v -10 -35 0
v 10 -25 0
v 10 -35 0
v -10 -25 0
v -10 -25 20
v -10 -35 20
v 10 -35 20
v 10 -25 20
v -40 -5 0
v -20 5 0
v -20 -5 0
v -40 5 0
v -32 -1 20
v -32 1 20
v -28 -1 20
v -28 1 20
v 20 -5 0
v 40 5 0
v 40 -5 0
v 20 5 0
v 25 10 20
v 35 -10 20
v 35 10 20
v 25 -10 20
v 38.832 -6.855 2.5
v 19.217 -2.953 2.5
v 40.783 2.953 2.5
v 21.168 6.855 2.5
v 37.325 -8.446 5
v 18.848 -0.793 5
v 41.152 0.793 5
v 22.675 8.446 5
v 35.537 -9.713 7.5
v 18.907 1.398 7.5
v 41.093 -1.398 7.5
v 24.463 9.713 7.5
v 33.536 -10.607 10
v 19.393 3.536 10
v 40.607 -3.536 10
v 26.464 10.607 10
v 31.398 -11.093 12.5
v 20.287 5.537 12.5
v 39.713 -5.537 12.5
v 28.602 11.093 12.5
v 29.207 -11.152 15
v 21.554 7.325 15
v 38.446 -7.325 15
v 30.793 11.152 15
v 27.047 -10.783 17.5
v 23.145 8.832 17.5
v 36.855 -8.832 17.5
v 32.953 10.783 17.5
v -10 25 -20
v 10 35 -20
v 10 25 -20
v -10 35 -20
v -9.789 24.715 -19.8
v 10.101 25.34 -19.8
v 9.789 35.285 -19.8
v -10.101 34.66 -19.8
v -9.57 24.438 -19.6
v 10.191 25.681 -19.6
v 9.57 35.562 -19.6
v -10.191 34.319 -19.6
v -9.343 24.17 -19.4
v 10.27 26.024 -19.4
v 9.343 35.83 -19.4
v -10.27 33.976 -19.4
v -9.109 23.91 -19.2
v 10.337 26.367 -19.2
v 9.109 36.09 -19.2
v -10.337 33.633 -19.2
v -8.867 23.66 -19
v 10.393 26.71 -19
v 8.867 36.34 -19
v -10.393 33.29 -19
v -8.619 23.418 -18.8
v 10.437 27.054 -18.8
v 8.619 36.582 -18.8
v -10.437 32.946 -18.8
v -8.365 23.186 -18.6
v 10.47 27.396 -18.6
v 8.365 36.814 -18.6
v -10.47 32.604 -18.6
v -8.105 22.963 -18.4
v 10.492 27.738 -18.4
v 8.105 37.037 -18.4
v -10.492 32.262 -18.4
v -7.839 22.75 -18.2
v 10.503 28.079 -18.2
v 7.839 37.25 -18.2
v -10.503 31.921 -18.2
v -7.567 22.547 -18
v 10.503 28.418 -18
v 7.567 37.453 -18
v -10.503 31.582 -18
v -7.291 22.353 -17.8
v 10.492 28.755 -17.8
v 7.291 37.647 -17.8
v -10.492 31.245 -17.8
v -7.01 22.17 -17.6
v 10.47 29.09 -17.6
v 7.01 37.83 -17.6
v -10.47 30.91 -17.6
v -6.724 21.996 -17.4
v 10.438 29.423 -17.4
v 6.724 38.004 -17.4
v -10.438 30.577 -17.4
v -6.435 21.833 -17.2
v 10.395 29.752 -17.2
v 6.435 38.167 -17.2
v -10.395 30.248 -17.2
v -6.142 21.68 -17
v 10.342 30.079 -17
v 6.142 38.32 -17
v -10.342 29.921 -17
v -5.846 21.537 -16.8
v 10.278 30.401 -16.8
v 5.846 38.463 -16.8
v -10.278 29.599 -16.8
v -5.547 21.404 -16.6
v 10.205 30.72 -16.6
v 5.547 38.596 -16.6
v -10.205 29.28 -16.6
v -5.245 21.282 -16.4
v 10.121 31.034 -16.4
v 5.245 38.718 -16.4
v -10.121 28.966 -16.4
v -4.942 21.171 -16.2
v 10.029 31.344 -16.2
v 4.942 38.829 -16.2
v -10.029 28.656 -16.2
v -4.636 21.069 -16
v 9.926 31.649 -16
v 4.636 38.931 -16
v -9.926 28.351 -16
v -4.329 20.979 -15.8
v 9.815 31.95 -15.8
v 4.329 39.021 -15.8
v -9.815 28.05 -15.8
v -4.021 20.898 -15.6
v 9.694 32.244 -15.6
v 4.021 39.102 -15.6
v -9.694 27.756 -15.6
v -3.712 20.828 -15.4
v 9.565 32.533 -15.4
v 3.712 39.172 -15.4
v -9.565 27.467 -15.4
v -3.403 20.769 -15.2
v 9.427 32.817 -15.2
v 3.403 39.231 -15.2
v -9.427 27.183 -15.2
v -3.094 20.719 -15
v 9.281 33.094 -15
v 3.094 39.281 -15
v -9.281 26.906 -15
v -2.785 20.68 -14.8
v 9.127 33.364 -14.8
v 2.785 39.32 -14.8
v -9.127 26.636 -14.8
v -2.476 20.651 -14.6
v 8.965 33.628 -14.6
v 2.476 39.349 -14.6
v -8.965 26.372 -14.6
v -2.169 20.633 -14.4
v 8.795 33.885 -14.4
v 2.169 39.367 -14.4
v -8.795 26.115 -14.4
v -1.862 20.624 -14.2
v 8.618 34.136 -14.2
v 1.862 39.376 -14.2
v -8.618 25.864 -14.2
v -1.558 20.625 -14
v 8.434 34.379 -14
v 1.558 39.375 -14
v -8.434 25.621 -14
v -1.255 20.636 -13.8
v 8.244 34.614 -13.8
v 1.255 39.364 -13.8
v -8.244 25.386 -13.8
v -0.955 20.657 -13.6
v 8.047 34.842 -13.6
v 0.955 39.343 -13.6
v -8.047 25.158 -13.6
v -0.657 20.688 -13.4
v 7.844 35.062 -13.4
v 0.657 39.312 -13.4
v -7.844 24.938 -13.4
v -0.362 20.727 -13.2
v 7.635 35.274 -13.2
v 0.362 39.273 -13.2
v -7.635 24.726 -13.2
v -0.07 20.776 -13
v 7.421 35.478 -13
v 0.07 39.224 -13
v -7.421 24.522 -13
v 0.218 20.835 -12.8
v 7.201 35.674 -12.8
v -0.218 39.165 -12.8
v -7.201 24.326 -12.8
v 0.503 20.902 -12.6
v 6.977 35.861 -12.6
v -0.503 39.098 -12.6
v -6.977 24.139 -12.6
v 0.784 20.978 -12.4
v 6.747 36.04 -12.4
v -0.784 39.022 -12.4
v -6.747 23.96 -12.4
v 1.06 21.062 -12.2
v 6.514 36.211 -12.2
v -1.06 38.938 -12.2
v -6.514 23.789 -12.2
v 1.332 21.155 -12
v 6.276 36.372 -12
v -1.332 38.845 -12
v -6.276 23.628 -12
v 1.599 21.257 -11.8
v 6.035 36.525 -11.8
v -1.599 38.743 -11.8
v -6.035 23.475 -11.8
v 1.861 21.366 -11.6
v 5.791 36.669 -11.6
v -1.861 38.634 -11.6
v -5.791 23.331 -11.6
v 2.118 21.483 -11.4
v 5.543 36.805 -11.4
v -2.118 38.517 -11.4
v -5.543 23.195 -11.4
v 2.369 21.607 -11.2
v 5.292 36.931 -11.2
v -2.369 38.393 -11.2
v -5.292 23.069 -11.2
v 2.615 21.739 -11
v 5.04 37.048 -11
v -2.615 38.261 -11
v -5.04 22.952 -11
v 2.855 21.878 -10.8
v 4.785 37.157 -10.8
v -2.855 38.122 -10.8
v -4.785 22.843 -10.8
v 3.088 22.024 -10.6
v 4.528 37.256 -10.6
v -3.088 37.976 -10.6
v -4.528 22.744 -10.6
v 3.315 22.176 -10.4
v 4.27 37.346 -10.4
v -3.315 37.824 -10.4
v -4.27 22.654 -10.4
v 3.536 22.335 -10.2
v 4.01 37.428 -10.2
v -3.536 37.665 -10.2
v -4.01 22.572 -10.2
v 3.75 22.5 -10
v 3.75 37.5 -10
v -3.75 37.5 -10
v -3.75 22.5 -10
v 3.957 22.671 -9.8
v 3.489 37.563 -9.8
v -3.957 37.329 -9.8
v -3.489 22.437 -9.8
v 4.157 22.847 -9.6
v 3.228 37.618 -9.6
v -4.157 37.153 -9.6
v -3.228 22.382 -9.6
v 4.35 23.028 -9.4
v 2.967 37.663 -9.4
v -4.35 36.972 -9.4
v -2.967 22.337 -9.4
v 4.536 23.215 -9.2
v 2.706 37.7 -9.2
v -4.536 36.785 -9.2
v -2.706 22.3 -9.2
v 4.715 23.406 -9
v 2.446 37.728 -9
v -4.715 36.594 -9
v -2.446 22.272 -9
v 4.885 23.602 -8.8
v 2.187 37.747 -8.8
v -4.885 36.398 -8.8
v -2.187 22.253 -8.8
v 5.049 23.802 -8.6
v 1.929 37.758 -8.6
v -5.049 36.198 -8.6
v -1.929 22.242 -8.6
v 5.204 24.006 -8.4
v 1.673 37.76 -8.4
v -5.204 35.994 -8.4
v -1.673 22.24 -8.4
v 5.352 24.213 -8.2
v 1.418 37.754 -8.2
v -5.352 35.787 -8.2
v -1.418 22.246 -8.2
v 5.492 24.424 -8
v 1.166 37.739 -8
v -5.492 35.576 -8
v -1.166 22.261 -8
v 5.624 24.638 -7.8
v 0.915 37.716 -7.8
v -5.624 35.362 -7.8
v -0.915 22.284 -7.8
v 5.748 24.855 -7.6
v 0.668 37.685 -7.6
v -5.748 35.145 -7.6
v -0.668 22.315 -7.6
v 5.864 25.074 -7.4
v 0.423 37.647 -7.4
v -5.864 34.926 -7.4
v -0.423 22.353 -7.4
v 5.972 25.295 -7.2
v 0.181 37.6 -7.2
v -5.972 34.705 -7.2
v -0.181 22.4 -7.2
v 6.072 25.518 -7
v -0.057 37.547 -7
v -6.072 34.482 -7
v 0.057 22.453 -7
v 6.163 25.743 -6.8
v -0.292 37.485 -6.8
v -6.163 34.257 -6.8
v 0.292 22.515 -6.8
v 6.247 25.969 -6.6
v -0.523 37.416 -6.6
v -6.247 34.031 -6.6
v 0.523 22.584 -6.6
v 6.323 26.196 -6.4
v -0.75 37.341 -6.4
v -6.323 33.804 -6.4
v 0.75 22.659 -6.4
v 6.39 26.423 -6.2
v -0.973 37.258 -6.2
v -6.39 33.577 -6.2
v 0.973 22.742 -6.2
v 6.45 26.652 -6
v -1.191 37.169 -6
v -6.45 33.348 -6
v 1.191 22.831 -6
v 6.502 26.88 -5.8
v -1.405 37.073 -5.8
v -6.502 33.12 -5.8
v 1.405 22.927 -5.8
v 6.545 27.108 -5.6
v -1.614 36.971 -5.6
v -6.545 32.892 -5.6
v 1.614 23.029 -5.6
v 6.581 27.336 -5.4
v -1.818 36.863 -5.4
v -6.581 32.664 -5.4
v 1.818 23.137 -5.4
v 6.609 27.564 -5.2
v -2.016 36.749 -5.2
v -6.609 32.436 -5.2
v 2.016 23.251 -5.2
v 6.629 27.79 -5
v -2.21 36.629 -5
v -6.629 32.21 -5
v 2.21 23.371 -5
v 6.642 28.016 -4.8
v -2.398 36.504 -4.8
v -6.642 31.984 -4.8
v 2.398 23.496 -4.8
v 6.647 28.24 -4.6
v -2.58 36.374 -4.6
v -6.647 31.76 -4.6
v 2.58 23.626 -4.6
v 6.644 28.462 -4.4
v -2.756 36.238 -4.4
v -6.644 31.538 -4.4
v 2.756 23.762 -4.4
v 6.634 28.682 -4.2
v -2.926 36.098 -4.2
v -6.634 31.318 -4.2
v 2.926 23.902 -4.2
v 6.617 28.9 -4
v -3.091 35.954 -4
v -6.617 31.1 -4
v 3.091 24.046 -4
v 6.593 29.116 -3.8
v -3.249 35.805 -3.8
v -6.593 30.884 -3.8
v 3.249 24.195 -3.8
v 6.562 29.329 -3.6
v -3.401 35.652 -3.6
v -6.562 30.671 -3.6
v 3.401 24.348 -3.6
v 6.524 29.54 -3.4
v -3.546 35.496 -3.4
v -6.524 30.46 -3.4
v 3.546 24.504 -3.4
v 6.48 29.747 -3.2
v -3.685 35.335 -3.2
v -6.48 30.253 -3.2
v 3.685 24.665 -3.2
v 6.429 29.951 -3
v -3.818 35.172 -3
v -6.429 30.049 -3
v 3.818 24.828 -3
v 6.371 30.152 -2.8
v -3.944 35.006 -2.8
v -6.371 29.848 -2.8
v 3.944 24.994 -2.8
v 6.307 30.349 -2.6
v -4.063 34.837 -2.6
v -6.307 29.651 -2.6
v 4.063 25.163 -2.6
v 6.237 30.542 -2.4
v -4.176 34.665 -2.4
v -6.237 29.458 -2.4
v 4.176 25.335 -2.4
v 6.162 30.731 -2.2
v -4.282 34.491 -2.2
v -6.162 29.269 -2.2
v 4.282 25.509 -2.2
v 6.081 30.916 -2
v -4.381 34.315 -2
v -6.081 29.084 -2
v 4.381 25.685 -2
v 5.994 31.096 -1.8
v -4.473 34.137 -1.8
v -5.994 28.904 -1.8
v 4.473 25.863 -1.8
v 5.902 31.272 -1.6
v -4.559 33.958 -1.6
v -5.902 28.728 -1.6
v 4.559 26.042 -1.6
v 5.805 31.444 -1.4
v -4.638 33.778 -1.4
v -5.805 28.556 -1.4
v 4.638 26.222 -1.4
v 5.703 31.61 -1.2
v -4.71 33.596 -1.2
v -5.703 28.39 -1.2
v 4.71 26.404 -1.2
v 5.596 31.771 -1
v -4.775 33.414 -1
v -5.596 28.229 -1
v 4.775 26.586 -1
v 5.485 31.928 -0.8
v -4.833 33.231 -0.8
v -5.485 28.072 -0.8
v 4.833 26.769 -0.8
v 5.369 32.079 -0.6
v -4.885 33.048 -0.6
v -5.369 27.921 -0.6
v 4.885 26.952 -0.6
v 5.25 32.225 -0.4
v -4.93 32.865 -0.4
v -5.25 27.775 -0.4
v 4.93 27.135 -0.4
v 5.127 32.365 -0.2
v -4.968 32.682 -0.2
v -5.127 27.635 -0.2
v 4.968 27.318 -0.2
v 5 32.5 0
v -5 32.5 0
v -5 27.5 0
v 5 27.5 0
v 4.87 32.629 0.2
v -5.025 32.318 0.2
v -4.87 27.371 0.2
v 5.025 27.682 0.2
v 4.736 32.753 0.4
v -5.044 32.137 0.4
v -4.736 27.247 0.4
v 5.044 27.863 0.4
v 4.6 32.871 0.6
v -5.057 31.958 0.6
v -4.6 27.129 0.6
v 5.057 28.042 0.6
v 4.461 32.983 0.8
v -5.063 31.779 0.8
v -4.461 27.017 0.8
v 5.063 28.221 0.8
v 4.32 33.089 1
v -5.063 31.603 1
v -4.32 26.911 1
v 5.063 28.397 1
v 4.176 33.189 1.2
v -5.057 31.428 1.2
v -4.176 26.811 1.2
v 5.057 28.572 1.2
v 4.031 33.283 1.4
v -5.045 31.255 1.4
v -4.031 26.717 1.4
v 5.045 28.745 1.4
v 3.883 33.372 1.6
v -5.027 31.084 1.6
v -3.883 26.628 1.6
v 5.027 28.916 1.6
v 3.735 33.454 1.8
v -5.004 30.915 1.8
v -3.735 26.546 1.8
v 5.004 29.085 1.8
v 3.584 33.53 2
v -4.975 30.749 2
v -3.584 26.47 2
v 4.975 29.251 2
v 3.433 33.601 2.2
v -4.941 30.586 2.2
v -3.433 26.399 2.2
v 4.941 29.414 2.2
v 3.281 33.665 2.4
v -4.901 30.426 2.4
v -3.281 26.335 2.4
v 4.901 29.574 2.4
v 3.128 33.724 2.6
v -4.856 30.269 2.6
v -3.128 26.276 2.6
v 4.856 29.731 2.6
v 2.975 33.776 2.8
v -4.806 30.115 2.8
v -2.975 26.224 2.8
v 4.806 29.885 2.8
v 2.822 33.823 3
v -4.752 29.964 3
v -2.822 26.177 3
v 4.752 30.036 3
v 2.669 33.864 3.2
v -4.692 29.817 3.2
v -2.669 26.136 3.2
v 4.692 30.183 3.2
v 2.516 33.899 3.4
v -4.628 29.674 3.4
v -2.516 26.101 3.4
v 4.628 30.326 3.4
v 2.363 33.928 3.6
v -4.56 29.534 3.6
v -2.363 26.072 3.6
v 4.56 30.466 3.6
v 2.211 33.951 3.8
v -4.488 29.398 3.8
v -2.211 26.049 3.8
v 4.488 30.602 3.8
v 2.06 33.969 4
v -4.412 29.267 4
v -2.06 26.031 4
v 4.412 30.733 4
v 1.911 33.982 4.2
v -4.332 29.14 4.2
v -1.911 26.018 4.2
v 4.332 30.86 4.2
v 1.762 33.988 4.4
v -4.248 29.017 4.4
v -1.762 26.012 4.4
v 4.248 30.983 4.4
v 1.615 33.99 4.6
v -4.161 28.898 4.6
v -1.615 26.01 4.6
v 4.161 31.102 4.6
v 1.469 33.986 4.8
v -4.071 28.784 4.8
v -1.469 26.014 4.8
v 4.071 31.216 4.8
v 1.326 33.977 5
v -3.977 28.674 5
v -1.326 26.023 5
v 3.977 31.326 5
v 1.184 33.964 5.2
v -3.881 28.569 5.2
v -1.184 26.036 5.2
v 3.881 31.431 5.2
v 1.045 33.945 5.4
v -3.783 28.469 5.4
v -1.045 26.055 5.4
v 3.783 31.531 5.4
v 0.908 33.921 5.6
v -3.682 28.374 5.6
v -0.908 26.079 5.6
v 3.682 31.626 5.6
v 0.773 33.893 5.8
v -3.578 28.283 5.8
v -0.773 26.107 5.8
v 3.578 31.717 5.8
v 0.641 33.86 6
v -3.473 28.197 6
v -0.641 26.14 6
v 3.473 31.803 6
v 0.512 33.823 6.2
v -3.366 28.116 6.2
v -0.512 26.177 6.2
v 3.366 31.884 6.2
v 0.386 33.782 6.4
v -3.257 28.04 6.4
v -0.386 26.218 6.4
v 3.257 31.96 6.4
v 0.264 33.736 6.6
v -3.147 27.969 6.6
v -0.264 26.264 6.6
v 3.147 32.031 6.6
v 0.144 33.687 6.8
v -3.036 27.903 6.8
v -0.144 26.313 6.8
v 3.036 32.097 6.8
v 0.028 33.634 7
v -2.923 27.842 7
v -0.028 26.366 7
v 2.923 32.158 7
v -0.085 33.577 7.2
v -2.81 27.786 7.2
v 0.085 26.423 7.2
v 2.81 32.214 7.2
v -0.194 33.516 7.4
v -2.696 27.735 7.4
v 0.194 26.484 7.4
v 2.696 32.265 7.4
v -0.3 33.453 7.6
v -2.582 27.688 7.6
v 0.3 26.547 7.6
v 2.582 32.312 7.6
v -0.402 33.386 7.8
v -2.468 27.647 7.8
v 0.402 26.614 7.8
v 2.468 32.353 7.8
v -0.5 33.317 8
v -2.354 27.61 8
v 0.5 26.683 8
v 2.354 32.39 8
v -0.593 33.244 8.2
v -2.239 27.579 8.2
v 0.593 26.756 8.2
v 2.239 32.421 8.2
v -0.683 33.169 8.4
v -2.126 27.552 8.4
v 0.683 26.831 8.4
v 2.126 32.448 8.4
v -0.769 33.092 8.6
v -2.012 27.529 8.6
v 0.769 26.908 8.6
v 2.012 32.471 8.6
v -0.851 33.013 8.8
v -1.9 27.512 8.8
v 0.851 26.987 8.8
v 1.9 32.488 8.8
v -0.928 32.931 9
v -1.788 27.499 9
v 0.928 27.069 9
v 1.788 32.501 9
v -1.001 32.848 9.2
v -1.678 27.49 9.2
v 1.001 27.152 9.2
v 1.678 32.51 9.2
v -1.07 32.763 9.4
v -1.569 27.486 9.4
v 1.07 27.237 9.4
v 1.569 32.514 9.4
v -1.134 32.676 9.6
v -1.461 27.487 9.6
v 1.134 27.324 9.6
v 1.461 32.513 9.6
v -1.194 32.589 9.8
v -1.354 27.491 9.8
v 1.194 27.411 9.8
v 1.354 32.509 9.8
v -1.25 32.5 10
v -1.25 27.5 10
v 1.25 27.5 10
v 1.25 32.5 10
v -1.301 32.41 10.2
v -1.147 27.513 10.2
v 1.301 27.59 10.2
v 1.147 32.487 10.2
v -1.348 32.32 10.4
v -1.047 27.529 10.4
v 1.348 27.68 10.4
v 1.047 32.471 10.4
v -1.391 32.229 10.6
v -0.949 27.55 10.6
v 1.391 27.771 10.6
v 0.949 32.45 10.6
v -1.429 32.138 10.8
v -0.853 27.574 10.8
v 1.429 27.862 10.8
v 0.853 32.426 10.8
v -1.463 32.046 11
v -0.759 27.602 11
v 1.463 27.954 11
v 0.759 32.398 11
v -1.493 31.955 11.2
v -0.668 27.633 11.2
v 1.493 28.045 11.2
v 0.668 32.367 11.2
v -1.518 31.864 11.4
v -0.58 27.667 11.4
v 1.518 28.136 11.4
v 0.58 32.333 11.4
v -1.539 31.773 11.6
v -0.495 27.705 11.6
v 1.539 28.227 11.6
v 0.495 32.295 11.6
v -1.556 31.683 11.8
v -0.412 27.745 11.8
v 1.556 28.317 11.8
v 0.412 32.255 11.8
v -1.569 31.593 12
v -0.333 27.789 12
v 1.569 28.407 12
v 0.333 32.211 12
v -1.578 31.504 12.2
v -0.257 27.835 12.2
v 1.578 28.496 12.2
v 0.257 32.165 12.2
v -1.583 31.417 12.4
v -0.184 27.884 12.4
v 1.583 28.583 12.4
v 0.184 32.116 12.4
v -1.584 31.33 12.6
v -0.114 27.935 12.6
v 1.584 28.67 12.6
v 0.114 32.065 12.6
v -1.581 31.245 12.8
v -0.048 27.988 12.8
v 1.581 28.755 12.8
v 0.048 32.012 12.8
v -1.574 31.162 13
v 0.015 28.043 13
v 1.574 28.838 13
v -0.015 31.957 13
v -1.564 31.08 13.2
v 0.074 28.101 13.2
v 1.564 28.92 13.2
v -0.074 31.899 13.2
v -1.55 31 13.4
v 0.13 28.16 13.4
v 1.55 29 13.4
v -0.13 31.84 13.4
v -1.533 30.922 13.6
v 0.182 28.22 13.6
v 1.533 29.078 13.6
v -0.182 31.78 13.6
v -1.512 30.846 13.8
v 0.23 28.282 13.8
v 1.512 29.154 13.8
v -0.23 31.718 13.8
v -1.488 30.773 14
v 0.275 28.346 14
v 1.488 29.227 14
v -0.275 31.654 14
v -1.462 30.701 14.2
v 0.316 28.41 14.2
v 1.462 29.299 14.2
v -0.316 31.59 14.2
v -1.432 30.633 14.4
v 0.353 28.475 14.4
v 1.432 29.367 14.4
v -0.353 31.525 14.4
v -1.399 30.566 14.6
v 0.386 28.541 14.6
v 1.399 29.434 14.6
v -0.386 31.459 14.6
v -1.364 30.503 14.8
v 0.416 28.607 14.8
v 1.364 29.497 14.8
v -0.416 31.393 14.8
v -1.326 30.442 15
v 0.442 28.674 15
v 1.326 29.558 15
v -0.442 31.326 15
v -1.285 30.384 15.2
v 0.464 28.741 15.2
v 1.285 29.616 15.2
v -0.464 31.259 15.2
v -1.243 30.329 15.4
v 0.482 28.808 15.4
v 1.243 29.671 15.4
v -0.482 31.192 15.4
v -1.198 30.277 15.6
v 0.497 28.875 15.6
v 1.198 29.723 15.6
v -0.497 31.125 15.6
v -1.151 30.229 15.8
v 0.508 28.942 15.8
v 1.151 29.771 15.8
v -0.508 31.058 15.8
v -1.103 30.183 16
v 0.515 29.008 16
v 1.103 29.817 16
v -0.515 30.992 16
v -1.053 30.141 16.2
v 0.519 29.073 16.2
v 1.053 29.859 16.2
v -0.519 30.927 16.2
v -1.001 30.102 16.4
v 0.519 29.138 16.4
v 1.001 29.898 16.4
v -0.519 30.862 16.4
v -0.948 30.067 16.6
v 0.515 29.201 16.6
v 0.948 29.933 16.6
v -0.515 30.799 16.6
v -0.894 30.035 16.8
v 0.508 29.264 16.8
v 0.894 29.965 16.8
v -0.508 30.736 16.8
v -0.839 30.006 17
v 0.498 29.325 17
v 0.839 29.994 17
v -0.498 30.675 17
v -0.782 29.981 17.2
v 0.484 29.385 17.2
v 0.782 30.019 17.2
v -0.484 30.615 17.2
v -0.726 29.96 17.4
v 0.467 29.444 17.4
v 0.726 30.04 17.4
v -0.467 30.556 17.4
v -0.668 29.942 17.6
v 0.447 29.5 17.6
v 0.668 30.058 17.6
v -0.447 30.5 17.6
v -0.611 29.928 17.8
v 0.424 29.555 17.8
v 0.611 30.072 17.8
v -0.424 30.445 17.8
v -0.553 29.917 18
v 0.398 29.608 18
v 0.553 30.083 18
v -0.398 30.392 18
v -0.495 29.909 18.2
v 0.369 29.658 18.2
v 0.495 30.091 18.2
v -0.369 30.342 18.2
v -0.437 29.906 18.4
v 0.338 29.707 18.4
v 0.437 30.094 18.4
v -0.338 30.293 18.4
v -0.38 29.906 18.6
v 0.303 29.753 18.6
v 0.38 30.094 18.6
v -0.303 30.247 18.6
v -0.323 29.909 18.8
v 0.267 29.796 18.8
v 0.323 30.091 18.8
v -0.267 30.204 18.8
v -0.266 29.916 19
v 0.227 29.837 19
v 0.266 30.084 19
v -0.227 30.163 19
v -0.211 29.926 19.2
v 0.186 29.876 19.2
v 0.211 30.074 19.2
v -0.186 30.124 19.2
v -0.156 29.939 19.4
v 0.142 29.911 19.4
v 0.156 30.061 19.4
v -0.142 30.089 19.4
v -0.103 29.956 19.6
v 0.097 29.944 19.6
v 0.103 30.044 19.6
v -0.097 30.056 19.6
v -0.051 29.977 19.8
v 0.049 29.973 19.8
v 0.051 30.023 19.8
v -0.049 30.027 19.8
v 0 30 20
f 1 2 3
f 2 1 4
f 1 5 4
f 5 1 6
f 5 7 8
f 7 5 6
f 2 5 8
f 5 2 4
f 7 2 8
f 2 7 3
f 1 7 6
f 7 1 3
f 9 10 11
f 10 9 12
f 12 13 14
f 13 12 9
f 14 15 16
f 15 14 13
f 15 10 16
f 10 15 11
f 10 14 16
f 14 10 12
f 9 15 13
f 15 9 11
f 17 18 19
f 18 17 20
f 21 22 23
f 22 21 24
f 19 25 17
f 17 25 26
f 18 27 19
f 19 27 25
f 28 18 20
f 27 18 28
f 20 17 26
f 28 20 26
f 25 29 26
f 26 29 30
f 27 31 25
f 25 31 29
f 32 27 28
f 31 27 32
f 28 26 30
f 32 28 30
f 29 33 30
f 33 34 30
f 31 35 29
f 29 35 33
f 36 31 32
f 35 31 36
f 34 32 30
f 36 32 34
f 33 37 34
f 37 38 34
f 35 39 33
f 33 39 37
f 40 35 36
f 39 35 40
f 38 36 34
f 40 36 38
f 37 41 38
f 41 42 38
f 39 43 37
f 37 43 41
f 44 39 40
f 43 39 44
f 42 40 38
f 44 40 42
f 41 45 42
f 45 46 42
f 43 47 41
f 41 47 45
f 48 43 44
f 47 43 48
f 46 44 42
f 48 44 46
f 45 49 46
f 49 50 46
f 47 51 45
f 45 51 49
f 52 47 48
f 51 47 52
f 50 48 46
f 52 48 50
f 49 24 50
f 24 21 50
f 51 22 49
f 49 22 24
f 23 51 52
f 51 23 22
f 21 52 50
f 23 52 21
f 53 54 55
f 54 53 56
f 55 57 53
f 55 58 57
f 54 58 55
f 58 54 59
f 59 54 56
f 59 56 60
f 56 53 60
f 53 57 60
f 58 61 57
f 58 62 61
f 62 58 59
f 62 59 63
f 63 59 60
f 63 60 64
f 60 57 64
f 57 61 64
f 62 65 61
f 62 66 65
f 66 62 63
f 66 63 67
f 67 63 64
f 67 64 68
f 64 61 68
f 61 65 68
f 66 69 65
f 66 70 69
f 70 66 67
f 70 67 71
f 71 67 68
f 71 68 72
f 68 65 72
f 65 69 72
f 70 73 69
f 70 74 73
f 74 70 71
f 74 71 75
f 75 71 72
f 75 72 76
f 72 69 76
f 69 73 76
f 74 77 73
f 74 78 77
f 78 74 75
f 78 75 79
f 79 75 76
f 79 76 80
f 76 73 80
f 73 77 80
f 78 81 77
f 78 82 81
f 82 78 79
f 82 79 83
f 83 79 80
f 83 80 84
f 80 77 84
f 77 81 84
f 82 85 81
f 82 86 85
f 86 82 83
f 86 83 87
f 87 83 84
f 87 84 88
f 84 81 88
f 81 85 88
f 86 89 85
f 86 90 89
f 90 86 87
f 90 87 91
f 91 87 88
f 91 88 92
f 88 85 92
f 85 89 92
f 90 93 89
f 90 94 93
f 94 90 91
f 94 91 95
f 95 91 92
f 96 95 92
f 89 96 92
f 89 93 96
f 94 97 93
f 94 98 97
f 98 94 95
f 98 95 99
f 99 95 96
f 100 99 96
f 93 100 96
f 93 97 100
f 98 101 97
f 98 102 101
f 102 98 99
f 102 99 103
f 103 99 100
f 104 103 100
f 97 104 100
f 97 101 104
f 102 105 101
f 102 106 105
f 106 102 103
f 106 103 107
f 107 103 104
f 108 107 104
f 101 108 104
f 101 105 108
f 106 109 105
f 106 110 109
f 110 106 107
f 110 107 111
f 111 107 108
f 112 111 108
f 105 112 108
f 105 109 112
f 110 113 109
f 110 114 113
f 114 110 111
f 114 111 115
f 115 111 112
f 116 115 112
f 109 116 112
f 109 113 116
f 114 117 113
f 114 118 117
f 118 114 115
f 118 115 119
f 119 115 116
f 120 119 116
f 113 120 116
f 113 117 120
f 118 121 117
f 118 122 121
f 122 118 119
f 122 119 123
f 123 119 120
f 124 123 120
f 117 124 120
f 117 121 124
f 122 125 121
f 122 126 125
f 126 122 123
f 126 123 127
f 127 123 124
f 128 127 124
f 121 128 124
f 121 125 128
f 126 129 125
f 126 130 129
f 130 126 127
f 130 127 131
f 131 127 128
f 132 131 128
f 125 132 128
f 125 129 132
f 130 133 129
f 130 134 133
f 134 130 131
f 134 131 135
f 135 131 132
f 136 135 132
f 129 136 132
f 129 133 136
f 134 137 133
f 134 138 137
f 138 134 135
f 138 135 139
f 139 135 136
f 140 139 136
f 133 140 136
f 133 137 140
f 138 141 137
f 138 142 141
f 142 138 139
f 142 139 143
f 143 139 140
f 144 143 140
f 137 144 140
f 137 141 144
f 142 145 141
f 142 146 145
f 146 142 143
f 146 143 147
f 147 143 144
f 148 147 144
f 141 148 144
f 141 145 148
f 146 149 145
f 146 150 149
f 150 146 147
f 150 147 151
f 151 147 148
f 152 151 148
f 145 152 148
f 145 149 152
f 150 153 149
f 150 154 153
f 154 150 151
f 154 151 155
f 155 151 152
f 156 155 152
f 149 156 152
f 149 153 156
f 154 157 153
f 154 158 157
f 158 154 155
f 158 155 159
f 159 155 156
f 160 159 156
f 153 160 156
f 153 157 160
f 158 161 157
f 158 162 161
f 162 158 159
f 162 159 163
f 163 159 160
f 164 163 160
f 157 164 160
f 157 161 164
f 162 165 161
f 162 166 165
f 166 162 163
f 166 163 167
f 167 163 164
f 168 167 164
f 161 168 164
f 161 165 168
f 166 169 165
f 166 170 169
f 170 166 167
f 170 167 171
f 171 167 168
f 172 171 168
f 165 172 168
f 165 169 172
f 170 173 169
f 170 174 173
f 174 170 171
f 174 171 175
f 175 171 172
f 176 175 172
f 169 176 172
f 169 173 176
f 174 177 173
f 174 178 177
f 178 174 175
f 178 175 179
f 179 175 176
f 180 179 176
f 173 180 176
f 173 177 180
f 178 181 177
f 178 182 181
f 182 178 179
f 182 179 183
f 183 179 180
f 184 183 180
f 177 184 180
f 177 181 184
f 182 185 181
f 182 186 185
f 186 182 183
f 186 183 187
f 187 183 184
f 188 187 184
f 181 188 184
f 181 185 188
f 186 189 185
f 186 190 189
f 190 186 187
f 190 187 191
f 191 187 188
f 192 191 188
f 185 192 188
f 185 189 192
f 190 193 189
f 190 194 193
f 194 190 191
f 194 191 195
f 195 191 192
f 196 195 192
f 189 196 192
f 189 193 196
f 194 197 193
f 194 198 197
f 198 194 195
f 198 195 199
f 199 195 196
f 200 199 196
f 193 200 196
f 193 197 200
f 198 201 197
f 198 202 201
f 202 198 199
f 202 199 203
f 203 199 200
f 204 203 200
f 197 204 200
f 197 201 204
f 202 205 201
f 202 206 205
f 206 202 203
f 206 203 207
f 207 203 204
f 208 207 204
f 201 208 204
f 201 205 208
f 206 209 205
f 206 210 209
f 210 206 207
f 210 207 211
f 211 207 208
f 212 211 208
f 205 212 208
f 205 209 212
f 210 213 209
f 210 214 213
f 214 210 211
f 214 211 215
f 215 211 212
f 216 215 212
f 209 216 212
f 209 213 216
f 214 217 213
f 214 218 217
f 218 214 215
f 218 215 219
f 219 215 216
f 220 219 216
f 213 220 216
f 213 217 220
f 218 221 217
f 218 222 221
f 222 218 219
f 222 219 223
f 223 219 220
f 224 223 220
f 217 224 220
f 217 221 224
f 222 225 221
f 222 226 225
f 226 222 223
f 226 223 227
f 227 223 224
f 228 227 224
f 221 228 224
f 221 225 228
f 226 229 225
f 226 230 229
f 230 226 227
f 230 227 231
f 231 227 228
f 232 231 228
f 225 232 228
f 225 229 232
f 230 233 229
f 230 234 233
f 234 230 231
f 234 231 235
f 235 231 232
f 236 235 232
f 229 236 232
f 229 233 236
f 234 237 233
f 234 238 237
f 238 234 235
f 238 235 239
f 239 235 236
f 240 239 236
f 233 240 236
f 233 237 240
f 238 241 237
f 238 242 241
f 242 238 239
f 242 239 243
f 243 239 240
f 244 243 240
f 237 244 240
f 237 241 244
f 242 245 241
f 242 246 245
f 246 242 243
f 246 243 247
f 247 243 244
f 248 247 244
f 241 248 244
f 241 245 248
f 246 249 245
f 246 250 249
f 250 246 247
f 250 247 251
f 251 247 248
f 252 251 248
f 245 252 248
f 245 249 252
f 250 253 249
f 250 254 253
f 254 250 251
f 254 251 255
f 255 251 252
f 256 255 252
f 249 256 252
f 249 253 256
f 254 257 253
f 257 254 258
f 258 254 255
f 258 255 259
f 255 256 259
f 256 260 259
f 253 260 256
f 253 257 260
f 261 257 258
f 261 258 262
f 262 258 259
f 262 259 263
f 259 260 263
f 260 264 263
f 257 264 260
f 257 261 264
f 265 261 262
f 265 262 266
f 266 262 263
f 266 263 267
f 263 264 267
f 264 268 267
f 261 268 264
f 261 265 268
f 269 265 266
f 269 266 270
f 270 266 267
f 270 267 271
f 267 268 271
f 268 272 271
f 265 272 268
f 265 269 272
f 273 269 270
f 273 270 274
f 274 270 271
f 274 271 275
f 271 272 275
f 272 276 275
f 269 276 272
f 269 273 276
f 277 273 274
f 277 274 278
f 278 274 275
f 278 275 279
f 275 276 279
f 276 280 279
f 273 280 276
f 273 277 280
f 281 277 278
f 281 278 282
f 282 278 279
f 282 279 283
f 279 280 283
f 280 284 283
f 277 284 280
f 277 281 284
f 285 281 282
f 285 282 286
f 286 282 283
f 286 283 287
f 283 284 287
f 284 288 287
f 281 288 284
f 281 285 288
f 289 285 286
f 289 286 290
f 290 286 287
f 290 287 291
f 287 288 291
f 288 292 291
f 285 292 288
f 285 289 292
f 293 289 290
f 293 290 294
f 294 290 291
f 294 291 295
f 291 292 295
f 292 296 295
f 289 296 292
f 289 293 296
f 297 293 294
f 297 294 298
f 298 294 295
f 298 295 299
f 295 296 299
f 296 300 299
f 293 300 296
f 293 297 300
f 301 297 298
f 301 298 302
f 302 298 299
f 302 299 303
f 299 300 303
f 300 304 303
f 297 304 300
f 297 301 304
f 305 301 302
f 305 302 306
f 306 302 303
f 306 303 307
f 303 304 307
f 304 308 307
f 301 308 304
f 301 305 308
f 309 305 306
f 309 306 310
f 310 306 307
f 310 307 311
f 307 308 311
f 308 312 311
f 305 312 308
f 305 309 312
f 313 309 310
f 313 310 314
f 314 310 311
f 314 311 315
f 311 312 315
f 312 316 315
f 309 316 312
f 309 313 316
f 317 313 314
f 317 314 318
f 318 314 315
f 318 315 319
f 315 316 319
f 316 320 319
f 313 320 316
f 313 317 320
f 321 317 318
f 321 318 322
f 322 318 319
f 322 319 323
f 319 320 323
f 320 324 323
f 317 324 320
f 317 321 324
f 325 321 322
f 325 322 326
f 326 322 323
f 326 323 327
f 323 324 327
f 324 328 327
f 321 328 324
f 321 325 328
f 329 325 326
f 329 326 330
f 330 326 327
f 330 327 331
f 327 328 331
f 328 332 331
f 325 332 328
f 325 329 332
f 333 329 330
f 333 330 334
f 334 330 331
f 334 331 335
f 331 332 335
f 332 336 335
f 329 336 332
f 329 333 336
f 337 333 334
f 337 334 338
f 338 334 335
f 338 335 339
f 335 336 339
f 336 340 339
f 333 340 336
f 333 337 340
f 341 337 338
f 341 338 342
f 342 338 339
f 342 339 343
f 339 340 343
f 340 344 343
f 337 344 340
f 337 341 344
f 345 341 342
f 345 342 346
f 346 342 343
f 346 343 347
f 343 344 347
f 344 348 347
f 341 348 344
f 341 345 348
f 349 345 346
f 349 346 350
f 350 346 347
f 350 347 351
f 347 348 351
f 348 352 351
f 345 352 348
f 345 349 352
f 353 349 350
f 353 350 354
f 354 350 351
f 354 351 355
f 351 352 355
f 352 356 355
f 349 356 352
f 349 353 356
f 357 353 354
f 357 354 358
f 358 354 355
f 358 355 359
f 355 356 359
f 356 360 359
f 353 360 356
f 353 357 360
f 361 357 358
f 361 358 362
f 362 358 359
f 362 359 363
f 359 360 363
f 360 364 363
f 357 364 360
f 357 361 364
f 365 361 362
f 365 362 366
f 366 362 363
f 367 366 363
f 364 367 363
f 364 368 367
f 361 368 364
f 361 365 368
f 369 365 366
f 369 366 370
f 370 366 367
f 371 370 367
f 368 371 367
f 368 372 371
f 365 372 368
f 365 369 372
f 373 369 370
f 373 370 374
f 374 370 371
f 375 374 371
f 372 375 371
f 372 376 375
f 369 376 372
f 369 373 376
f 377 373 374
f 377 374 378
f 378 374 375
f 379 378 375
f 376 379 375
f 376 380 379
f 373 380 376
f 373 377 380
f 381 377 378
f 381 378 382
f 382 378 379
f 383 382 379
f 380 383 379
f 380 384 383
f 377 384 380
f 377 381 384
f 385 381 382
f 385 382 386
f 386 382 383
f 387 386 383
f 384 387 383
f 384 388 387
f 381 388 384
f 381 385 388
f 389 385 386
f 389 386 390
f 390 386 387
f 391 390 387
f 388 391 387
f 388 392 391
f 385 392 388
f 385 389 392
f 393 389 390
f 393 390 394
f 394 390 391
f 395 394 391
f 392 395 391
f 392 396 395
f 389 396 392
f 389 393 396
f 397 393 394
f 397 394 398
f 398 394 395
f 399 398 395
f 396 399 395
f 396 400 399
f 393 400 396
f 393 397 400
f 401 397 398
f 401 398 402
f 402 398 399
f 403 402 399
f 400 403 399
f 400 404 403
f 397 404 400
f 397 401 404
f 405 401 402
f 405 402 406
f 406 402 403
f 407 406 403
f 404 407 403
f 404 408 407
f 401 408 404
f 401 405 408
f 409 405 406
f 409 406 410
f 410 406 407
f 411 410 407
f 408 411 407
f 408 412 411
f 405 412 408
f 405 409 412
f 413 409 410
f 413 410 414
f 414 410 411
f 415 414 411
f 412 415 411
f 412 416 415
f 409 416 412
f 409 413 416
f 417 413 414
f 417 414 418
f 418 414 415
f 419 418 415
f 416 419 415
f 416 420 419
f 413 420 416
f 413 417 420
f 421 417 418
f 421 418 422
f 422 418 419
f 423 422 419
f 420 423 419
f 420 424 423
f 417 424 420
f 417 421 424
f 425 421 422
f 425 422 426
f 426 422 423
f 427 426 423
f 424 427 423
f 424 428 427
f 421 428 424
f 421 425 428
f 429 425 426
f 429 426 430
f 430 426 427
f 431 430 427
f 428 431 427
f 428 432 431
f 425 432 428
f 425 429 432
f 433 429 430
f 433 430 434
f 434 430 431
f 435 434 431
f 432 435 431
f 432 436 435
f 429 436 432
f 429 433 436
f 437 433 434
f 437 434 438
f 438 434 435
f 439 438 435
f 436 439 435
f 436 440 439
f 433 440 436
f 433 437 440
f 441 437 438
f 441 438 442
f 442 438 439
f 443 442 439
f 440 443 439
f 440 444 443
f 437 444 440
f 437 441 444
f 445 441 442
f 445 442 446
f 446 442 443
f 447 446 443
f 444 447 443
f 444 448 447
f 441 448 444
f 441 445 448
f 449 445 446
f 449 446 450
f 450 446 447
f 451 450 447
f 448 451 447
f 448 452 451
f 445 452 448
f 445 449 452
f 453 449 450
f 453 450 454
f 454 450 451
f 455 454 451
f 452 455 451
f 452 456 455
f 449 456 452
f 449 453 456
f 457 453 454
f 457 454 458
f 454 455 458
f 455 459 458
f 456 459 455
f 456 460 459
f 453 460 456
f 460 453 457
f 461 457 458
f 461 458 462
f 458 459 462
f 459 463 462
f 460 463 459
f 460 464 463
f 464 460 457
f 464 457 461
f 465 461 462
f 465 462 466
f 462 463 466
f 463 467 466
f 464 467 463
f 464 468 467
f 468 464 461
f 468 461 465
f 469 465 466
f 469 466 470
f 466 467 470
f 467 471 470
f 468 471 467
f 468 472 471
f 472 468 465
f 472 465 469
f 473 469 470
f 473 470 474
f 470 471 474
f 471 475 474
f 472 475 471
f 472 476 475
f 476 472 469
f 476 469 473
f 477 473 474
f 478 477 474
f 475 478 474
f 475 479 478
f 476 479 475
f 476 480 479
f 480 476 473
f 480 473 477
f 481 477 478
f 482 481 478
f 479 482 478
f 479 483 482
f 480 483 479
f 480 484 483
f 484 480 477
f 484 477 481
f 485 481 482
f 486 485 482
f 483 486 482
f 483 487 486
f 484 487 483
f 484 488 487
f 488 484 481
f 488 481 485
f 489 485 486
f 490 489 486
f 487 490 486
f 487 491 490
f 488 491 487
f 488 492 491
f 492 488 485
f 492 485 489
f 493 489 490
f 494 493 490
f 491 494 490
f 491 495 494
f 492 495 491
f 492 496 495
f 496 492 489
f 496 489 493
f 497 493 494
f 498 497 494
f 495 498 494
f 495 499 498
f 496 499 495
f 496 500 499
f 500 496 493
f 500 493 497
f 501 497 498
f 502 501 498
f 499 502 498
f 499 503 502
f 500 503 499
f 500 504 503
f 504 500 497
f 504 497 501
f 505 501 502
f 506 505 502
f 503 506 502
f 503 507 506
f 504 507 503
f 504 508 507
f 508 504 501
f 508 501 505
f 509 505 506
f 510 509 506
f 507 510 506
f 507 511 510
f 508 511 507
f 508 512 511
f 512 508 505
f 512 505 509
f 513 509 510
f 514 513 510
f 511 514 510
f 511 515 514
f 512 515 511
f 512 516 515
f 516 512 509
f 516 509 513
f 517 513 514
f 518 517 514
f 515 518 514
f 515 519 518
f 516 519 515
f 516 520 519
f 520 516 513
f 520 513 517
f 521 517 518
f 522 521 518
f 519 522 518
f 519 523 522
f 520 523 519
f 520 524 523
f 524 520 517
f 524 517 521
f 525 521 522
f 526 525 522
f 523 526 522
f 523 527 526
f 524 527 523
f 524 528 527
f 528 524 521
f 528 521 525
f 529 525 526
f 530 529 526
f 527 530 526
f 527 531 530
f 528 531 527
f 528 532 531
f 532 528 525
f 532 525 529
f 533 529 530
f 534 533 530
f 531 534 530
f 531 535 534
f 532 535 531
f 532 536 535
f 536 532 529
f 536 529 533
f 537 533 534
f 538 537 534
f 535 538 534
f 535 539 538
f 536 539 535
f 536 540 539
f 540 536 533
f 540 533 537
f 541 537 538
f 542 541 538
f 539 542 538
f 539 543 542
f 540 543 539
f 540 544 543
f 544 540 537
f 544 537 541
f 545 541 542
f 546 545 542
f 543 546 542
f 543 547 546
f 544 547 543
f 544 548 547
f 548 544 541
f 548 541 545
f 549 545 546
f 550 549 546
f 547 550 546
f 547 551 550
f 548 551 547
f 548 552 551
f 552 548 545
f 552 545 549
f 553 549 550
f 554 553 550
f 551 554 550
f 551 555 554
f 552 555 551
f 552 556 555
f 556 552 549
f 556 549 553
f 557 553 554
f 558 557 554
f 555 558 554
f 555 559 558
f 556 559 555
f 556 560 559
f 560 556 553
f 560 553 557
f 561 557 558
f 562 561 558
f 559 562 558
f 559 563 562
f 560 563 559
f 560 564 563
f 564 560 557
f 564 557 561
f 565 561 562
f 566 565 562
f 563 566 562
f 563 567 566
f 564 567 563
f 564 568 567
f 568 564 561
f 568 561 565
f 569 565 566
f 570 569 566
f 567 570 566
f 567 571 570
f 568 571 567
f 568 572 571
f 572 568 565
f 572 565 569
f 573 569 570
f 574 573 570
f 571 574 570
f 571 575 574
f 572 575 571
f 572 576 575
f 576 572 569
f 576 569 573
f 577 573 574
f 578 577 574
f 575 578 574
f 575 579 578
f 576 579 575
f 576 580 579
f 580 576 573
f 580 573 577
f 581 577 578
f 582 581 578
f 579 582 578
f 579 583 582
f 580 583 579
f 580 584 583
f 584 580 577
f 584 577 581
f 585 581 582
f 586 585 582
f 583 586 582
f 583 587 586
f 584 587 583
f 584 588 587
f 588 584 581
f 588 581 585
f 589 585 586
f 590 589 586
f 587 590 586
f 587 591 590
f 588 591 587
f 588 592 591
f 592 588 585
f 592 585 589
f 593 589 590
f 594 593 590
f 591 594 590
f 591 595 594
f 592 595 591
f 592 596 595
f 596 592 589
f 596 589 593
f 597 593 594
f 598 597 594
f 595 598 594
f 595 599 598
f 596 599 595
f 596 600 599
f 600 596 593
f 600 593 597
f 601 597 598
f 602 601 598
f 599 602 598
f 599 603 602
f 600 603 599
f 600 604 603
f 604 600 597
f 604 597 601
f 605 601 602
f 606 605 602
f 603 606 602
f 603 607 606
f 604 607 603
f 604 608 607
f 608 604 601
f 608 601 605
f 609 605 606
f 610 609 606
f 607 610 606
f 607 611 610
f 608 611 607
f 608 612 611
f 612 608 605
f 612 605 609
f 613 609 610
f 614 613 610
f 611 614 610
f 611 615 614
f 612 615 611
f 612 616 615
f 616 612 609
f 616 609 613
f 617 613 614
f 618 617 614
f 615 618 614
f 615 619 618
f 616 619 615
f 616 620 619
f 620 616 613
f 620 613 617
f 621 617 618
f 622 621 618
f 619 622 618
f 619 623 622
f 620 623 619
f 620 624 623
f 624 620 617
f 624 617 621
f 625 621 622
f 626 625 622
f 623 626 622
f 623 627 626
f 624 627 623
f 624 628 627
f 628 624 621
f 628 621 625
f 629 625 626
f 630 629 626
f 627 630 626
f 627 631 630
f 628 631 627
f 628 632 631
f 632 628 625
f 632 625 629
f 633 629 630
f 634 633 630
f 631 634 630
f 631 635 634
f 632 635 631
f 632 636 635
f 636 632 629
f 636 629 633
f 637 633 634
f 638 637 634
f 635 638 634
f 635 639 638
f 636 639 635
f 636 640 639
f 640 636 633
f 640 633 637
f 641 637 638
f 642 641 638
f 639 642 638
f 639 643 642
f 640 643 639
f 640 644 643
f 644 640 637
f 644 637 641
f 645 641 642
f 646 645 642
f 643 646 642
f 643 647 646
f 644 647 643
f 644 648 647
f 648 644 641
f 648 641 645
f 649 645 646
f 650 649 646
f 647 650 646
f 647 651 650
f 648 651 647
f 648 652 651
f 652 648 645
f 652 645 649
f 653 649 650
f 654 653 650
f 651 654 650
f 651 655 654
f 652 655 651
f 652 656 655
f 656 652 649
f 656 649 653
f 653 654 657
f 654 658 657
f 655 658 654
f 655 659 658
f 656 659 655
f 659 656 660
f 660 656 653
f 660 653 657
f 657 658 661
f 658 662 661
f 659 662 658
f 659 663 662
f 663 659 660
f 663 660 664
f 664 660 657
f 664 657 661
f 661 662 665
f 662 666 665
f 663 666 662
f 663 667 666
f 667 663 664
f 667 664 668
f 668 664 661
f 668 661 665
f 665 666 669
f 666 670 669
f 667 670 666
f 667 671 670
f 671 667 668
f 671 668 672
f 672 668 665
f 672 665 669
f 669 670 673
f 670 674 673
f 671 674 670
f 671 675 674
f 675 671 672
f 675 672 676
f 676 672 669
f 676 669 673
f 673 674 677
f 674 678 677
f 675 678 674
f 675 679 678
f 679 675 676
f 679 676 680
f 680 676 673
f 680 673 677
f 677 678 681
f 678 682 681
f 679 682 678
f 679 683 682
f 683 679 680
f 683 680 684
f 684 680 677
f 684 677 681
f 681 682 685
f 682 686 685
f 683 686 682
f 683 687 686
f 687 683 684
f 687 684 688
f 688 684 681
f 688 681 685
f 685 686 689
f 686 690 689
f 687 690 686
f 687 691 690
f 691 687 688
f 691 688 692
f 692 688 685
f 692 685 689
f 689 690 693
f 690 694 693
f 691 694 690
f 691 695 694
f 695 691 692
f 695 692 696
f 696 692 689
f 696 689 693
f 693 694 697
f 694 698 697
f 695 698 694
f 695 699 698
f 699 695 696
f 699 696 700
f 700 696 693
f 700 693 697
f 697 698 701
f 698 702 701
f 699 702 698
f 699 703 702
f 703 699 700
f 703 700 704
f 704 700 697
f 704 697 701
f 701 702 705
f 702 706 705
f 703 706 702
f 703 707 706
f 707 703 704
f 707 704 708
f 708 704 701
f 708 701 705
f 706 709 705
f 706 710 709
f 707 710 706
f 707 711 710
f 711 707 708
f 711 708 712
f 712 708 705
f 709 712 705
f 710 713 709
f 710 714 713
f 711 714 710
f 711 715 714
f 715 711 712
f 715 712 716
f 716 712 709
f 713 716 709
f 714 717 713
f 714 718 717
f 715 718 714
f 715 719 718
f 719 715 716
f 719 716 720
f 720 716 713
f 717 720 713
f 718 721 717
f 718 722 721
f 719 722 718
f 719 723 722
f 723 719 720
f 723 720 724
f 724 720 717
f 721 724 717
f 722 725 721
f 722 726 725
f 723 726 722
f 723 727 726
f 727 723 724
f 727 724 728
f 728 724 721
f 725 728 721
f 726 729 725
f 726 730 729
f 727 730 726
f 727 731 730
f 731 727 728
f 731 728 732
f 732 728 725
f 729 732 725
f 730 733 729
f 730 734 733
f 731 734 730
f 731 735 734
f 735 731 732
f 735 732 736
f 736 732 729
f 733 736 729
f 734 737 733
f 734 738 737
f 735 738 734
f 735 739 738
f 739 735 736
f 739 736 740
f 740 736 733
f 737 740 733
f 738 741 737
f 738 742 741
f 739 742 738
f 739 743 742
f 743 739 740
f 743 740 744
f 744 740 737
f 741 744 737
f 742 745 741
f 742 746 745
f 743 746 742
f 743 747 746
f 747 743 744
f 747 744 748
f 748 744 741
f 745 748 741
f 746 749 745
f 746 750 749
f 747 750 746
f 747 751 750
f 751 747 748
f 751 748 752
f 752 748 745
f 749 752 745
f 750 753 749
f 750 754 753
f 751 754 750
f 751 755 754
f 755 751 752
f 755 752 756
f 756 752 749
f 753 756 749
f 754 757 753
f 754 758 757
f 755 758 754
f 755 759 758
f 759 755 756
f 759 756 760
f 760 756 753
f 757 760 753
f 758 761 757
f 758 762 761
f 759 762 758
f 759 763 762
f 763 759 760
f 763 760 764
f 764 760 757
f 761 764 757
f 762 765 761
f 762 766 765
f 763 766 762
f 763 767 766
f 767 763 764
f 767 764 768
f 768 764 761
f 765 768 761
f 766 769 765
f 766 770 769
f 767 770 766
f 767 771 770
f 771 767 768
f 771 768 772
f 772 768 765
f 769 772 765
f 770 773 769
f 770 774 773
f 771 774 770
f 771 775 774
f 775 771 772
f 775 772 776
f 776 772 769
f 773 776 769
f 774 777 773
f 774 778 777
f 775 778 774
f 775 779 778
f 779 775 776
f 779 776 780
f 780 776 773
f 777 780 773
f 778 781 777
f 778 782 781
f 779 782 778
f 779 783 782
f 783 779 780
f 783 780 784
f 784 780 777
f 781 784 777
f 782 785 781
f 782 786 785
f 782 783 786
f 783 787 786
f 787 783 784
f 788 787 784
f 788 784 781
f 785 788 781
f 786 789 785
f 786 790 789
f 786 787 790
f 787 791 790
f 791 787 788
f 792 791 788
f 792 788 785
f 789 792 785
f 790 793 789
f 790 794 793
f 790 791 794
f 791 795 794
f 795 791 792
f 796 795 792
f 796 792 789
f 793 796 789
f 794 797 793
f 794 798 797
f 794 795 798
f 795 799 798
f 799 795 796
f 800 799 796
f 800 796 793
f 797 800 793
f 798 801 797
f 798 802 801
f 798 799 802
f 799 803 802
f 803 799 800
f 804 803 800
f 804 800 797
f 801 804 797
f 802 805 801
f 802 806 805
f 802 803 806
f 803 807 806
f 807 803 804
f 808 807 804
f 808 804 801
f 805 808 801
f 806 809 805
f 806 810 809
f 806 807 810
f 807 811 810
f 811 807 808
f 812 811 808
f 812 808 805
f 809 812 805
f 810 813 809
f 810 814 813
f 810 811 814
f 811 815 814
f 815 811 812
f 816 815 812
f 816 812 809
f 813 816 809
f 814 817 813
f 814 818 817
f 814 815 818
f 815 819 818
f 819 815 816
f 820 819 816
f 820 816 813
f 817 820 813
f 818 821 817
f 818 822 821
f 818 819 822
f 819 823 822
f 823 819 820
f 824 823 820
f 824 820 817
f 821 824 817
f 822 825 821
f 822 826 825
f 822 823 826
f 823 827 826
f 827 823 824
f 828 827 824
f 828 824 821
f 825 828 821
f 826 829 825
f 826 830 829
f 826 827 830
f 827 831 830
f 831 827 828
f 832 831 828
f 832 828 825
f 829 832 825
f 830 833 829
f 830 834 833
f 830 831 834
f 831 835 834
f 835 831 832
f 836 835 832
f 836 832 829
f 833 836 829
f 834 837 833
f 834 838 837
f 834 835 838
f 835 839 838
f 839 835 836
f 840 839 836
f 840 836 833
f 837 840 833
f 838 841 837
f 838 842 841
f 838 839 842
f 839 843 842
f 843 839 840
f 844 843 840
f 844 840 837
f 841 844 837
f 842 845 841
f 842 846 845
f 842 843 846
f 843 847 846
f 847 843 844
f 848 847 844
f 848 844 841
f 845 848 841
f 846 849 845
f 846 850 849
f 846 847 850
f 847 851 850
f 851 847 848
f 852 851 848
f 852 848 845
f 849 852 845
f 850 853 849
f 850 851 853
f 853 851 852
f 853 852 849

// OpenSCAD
module rep(n) {
    //cube([2,2,2], center=true);
    sphere(r=2,$fa=.05);
    if (n > 0) { 
        rotate(24,[0,.5,1])
            translate([1.61,0,0]) scale(.85) rep(n-1);      
    //    rotate(-60,[0,.5,1])
    //        translate([1.61,0,0]) scale(.7) rep(n-1);
    }
}

module rep2D(n) {
    difference() {
        square([2,2], center=true);
        square([1.2,1.2], center=true);
    }
    if (n > 0) {
        rotate(20)
            translate([1.5,0]) scale(.8) rep2D(n-1);      
    //    rotate(-40)
     //       translate([1.85,0]) scale(.7) rep2D(n-1);
    }
}


// simple 2D -> 3D extrusion of a rectangle
color("red")
    translate([0, -30, 0])
        linear_extrude(height = 20)
            square([20, 10], center = true);

// using the scale parameter a frustum can be constructed
color("green")
    translate([-30, 0, 0])
        linear_extrude(height = 20, scale = 0.2)
            square([20, 10], center = true);

// with twist the extruded shape will rotate around the Z axis
color("cyan")
    translate([30, 0, 0])
        linear_extrude(height = 20, twist = 90)
            square([20, 10], center = true);

// combining both relatively complex shapes can be created
color("gray")
    translate([0, 30, 0])
        linear_extrude(height = 40, twist = -360, scale = 0, center = true, slices = 200)
            square([20, 10], center = true);
//rep(24);
